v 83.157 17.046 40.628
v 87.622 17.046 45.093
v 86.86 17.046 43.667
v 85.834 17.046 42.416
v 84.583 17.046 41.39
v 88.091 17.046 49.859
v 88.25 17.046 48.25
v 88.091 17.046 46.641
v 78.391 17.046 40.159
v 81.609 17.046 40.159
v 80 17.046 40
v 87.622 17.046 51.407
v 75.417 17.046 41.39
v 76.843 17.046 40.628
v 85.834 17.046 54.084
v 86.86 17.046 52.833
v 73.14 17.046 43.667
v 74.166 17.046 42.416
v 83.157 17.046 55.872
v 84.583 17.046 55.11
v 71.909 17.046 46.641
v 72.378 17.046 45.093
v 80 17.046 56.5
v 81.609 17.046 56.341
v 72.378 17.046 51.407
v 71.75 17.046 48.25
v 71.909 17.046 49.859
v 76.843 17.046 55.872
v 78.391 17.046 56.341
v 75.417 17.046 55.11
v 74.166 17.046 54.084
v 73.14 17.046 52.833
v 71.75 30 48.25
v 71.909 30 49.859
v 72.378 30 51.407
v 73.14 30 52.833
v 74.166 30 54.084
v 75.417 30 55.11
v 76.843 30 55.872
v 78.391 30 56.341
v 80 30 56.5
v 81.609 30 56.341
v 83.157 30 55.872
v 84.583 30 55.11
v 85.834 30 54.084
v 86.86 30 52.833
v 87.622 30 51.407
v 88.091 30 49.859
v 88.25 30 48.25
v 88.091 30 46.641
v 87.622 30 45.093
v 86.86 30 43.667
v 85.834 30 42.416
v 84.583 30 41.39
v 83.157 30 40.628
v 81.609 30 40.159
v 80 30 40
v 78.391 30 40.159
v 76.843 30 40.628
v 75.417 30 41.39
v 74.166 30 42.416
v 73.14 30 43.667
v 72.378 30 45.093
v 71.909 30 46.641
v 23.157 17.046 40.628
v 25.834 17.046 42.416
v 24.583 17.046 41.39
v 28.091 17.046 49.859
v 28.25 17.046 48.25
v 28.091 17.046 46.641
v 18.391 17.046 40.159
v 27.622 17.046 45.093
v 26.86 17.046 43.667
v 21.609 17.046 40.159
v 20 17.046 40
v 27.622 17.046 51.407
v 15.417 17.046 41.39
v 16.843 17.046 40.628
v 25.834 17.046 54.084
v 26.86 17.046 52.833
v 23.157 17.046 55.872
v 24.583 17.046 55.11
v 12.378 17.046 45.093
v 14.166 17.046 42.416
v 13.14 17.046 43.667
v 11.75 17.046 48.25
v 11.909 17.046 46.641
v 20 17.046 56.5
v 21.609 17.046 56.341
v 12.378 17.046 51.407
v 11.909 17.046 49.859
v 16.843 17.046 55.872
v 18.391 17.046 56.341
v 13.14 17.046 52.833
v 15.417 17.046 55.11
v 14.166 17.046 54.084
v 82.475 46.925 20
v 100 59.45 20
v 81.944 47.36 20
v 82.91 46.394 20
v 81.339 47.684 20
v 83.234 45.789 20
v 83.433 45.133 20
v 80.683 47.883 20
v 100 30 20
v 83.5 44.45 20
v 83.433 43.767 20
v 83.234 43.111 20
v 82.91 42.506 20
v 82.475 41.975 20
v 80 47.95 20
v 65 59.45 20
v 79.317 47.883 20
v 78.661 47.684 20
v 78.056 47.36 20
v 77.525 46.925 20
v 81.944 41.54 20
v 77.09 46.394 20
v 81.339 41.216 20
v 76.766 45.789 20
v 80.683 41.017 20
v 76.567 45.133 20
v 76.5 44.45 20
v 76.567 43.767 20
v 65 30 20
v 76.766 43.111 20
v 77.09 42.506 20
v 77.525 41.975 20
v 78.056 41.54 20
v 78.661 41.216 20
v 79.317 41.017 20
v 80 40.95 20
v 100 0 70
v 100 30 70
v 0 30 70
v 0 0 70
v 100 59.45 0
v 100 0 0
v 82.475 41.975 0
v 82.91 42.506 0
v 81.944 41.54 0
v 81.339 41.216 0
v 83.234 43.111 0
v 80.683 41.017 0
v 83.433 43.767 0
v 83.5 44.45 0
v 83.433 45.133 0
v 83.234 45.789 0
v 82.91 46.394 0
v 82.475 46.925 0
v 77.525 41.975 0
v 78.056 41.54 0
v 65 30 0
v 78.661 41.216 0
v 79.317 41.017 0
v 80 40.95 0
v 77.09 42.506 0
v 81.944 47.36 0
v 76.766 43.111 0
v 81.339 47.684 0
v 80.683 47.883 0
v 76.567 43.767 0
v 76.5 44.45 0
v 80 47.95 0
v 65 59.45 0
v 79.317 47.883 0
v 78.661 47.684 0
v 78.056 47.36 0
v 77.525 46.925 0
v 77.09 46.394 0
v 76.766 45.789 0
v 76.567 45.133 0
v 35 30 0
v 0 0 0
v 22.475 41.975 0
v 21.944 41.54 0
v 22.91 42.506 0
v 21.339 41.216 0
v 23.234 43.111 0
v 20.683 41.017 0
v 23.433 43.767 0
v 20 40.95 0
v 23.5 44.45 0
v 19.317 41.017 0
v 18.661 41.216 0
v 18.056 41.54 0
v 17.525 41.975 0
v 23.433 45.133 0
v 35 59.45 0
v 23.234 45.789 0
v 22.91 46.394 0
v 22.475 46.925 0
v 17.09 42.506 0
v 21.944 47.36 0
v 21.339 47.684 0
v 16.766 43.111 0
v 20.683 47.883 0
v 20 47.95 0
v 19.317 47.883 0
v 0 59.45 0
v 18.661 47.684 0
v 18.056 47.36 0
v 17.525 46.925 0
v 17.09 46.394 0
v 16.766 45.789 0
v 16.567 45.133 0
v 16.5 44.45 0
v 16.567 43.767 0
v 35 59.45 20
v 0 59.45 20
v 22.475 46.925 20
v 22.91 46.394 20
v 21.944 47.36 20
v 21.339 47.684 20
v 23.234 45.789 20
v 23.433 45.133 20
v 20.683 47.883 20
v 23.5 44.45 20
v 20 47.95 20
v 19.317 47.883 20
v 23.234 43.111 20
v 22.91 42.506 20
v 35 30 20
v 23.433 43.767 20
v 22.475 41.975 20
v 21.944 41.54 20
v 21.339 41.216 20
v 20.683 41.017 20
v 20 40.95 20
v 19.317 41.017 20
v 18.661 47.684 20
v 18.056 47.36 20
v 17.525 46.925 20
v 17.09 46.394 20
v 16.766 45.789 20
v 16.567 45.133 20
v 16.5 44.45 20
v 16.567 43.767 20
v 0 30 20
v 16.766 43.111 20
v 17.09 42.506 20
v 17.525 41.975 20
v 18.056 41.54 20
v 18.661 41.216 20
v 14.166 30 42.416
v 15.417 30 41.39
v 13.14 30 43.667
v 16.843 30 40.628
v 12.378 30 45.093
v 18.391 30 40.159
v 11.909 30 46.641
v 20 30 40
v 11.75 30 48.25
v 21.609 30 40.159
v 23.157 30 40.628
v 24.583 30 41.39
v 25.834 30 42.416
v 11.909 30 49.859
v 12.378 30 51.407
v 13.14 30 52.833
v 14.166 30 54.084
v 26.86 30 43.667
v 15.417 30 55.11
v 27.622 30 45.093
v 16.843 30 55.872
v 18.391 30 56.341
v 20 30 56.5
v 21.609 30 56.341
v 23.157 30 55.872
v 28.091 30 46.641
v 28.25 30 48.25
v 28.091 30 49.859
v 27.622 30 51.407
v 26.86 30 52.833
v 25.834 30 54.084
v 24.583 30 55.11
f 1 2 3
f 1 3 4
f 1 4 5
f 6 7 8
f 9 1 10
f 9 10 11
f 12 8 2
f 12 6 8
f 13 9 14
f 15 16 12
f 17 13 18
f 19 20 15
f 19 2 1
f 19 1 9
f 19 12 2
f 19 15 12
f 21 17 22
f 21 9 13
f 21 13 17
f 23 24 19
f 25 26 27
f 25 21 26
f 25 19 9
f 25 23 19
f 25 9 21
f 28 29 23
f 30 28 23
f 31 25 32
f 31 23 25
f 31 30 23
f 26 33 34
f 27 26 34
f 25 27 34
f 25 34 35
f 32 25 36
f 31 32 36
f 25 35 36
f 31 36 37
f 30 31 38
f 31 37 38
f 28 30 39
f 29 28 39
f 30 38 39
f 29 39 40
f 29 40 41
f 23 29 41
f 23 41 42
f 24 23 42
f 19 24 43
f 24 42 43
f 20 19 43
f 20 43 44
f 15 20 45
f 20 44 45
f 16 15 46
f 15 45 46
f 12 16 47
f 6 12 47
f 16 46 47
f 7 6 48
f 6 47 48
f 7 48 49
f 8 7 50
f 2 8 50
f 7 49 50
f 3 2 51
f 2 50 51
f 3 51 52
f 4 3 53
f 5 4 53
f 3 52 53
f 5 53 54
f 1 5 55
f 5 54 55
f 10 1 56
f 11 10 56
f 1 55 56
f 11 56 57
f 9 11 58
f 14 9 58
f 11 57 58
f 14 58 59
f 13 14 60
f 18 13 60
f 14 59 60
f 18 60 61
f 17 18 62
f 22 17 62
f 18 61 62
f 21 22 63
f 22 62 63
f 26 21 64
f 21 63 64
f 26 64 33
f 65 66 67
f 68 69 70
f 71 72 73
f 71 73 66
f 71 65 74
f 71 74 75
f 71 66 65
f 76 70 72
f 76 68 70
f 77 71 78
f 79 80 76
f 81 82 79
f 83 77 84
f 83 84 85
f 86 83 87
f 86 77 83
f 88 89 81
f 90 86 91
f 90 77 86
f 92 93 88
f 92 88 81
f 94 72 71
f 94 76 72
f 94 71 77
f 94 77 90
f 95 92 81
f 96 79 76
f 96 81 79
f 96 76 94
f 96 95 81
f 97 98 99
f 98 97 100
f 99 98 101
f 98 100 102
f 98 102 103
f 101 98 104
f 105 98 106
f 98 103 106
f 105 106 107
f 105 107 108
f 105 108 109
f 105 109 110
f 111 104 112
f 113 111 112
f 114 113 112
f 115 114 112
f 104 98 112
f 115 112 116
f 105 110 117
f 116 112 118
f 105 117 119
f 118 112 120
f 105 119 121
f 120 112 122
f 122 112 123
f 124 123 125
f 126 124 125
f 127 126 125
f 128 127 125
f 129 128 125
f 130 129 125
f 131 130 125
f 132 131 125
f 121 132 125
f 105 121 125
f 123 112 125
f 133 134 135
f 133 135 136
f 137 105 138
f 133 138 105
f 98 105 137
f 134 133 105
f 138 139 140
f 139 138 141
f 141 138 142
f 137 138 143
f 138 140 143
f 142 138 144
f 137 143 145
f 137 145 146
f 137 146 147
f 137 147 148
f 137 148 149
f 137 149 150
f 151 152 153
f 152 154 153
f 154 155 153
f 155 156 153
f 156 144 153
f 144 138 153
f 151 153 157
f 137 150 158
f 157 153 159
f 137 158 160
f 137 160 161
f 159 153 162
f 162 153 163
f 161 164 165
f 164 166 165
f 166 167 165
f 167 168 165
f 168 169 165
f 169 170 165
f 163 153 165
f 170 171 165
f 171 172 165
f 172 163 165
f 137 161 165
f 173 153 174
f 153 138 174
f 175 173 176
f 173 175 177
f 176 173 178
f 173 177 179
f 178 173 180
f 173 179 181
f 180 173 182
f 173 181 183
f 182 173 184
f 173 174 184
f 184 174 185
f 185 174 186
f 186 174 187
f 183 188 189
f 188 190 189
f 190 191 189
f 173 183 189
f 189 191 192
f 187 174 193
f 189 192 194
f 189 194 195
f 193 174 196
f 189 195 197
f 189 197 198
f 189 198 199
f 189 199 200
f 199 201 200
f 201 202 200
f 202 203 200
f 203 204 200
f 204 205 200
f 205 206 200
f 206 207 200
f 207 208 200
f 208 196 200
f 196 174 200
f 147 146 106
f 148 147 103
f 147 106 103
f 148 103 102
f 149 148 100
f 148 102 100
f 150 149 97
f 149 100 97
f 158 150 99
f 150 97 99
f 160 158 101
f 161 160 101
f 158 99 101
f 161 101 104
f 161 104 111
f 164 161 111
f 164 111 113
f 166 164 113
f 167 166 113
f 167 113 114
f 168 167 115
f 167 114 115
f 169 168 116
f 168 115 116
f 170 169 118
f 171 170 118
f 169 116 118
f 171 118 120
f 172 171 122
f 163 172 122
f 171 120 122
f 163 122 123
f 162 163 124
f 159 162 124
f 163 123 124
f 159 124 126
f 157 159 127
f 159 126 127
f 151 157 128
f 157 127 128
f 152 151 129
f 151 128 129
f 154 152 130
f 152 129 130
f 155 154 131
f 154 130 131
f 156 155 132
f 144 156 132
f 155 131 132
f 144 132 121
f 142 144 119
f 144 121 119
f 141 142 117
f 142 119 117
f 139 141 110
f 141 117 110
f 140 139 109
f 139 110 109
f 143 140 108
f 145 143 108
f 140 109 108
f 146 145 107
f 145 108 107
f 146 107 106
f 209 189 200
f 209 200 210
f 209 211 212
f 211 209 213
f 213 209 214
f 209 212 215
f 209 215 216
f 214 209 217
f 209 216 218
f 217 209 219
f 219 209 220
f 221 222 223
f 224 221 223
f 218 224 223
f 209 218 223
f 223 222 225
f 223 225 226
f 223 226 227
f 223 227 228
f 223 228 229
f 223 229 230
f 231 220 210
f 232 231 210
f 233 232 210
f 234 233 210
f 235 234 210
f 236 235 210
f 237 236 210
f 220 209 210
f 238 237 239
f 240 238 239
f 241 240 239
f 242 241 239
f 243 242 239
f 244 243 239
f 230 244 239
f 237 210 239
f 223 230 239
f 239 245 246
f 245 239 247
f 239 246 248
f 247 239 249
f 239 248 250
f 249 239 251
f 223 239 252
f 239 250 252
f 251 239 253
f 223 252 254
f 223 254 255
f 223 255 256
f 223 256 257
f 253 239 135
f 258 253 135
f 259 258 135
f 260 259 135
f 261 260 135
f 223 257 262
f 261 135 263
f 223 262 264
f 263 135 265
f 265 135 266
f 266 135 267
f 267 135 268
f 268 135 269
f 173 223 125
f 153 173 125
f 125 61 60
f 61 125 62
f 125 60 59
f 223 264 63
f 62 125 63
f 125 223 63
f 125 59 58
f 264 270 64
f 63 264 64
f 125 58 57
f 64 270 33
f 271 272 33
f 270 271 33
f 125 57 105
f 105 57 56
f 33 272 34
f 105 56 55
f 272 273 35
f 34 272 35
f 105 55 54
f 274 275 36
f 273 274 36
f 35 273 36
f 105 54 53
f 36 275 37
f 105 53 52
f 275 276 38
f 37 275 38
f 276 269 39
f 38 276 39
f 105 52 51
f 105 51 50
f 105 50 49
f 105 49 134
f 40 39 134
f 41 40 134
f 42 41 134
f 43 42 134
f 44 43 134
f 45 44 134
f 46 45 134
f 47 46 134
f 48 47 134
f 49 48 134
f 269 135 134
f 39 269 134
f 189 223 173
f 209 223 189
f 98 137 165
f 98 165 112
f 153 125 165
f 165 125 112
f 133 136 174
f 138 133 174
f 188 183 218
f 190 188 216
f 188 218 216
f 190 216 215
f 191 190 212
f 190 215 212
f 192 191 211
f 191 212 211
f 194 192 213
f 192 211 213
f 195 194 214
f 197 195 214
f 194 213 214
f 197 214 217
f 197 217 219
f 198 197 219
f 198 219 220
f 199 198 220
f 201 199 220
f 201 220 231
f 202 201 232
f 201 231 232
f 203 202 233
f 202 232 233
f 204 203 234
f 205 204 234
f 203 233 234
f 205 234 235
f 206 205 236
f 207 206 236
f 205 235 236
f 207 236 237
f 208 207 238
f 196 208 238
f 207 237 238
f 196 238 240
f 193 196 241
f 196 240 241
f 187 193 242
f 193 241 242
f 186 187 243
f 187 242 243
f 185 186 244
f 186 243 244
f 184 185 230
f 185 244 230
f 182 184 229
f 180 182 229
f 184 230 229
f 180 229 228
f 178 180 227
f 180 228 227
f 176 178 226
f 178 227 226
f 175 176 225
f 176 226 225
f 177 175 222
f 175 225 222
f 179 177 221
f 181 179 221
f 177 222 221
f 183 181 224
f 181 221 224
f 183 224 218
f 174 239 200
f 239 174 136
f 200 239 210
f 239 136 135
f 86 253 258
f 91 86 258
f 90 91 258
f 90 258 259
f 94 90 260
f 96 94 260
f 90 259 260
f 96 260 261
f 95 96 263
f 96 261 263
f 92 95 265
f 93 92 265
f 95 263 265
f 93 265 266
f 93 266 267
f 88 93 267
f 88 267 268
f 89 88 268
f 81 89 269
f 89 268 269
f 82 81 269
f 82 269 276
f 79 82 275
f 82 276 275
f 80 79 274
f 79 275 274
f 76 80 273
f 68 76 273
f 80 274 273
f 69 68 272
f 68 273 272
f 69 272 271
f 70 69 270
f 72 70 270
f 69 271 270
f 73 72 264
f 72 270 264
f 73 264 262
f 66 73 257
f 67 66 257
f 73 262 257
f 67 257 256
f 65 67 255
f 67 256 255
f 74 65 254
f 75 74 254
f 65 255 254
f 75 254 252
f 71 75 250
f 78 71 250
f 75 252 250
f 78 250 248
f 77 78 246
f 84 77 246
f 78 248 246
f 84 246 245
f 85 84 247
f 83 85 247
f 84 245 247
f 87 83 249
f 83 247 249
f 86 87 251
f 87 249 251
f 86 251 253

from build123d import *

# Parameters (mm, degrees)
F1_DEPTH = 100
F2_R     = 8.25
F3_DEPTH = 12.954
F4_R     = 3.5
F5_DEPTH = 20
F6_W     = 30
F6_H     = 29.45
F7_DEPTH = 20


with BuildPart() as f1:
    # F0 (on Right) → F1 (new body)
    with BuildSketch(Plane.YZ):
        Polygon((0, 0), (59.45, 0), (59.45, 20), (30, 20), (30, 70), (0, 70), align=None)
    extrude(amount=F1_DEPTH)

    # F2 (on face) → F3 (cut)
    with BuildSketch(Plane(origin=(0, 30, 0), x_dir=(-1, 0, 0), z_dir=(0, 1, 0))):
        with Locations((-80, 48.25)):
            Circle(F2_R)
        with Locations((-20, 48.25)):
            Circle(F2_R)
    extrude(amount=-F3_DEPTH, mode=Mode.SUBTRACT)

    # F4 (on face) → F5 (cut, through all)
    with BuildSketch(Plane.XY.offset(20)):
        with Locations((80, 44.45)):
            Circle(F4_R)
        with Locations((20, 44.45)):
            Circle(F4_R)
    extrude(amount=-F5_DEPTH, mode=Mode.SUBTRACT)

    # F6 (on face) → F7 (cut, through all)
    with BuildSketch(Plane.XY.offset(20)):
        with Locations((50, 44.725)):
            Rectangle(F6_W, F6_H)
    extrude(amount=-F7_DEPTH, mode=Mode.SUBTRACT)


solid = f1.part
